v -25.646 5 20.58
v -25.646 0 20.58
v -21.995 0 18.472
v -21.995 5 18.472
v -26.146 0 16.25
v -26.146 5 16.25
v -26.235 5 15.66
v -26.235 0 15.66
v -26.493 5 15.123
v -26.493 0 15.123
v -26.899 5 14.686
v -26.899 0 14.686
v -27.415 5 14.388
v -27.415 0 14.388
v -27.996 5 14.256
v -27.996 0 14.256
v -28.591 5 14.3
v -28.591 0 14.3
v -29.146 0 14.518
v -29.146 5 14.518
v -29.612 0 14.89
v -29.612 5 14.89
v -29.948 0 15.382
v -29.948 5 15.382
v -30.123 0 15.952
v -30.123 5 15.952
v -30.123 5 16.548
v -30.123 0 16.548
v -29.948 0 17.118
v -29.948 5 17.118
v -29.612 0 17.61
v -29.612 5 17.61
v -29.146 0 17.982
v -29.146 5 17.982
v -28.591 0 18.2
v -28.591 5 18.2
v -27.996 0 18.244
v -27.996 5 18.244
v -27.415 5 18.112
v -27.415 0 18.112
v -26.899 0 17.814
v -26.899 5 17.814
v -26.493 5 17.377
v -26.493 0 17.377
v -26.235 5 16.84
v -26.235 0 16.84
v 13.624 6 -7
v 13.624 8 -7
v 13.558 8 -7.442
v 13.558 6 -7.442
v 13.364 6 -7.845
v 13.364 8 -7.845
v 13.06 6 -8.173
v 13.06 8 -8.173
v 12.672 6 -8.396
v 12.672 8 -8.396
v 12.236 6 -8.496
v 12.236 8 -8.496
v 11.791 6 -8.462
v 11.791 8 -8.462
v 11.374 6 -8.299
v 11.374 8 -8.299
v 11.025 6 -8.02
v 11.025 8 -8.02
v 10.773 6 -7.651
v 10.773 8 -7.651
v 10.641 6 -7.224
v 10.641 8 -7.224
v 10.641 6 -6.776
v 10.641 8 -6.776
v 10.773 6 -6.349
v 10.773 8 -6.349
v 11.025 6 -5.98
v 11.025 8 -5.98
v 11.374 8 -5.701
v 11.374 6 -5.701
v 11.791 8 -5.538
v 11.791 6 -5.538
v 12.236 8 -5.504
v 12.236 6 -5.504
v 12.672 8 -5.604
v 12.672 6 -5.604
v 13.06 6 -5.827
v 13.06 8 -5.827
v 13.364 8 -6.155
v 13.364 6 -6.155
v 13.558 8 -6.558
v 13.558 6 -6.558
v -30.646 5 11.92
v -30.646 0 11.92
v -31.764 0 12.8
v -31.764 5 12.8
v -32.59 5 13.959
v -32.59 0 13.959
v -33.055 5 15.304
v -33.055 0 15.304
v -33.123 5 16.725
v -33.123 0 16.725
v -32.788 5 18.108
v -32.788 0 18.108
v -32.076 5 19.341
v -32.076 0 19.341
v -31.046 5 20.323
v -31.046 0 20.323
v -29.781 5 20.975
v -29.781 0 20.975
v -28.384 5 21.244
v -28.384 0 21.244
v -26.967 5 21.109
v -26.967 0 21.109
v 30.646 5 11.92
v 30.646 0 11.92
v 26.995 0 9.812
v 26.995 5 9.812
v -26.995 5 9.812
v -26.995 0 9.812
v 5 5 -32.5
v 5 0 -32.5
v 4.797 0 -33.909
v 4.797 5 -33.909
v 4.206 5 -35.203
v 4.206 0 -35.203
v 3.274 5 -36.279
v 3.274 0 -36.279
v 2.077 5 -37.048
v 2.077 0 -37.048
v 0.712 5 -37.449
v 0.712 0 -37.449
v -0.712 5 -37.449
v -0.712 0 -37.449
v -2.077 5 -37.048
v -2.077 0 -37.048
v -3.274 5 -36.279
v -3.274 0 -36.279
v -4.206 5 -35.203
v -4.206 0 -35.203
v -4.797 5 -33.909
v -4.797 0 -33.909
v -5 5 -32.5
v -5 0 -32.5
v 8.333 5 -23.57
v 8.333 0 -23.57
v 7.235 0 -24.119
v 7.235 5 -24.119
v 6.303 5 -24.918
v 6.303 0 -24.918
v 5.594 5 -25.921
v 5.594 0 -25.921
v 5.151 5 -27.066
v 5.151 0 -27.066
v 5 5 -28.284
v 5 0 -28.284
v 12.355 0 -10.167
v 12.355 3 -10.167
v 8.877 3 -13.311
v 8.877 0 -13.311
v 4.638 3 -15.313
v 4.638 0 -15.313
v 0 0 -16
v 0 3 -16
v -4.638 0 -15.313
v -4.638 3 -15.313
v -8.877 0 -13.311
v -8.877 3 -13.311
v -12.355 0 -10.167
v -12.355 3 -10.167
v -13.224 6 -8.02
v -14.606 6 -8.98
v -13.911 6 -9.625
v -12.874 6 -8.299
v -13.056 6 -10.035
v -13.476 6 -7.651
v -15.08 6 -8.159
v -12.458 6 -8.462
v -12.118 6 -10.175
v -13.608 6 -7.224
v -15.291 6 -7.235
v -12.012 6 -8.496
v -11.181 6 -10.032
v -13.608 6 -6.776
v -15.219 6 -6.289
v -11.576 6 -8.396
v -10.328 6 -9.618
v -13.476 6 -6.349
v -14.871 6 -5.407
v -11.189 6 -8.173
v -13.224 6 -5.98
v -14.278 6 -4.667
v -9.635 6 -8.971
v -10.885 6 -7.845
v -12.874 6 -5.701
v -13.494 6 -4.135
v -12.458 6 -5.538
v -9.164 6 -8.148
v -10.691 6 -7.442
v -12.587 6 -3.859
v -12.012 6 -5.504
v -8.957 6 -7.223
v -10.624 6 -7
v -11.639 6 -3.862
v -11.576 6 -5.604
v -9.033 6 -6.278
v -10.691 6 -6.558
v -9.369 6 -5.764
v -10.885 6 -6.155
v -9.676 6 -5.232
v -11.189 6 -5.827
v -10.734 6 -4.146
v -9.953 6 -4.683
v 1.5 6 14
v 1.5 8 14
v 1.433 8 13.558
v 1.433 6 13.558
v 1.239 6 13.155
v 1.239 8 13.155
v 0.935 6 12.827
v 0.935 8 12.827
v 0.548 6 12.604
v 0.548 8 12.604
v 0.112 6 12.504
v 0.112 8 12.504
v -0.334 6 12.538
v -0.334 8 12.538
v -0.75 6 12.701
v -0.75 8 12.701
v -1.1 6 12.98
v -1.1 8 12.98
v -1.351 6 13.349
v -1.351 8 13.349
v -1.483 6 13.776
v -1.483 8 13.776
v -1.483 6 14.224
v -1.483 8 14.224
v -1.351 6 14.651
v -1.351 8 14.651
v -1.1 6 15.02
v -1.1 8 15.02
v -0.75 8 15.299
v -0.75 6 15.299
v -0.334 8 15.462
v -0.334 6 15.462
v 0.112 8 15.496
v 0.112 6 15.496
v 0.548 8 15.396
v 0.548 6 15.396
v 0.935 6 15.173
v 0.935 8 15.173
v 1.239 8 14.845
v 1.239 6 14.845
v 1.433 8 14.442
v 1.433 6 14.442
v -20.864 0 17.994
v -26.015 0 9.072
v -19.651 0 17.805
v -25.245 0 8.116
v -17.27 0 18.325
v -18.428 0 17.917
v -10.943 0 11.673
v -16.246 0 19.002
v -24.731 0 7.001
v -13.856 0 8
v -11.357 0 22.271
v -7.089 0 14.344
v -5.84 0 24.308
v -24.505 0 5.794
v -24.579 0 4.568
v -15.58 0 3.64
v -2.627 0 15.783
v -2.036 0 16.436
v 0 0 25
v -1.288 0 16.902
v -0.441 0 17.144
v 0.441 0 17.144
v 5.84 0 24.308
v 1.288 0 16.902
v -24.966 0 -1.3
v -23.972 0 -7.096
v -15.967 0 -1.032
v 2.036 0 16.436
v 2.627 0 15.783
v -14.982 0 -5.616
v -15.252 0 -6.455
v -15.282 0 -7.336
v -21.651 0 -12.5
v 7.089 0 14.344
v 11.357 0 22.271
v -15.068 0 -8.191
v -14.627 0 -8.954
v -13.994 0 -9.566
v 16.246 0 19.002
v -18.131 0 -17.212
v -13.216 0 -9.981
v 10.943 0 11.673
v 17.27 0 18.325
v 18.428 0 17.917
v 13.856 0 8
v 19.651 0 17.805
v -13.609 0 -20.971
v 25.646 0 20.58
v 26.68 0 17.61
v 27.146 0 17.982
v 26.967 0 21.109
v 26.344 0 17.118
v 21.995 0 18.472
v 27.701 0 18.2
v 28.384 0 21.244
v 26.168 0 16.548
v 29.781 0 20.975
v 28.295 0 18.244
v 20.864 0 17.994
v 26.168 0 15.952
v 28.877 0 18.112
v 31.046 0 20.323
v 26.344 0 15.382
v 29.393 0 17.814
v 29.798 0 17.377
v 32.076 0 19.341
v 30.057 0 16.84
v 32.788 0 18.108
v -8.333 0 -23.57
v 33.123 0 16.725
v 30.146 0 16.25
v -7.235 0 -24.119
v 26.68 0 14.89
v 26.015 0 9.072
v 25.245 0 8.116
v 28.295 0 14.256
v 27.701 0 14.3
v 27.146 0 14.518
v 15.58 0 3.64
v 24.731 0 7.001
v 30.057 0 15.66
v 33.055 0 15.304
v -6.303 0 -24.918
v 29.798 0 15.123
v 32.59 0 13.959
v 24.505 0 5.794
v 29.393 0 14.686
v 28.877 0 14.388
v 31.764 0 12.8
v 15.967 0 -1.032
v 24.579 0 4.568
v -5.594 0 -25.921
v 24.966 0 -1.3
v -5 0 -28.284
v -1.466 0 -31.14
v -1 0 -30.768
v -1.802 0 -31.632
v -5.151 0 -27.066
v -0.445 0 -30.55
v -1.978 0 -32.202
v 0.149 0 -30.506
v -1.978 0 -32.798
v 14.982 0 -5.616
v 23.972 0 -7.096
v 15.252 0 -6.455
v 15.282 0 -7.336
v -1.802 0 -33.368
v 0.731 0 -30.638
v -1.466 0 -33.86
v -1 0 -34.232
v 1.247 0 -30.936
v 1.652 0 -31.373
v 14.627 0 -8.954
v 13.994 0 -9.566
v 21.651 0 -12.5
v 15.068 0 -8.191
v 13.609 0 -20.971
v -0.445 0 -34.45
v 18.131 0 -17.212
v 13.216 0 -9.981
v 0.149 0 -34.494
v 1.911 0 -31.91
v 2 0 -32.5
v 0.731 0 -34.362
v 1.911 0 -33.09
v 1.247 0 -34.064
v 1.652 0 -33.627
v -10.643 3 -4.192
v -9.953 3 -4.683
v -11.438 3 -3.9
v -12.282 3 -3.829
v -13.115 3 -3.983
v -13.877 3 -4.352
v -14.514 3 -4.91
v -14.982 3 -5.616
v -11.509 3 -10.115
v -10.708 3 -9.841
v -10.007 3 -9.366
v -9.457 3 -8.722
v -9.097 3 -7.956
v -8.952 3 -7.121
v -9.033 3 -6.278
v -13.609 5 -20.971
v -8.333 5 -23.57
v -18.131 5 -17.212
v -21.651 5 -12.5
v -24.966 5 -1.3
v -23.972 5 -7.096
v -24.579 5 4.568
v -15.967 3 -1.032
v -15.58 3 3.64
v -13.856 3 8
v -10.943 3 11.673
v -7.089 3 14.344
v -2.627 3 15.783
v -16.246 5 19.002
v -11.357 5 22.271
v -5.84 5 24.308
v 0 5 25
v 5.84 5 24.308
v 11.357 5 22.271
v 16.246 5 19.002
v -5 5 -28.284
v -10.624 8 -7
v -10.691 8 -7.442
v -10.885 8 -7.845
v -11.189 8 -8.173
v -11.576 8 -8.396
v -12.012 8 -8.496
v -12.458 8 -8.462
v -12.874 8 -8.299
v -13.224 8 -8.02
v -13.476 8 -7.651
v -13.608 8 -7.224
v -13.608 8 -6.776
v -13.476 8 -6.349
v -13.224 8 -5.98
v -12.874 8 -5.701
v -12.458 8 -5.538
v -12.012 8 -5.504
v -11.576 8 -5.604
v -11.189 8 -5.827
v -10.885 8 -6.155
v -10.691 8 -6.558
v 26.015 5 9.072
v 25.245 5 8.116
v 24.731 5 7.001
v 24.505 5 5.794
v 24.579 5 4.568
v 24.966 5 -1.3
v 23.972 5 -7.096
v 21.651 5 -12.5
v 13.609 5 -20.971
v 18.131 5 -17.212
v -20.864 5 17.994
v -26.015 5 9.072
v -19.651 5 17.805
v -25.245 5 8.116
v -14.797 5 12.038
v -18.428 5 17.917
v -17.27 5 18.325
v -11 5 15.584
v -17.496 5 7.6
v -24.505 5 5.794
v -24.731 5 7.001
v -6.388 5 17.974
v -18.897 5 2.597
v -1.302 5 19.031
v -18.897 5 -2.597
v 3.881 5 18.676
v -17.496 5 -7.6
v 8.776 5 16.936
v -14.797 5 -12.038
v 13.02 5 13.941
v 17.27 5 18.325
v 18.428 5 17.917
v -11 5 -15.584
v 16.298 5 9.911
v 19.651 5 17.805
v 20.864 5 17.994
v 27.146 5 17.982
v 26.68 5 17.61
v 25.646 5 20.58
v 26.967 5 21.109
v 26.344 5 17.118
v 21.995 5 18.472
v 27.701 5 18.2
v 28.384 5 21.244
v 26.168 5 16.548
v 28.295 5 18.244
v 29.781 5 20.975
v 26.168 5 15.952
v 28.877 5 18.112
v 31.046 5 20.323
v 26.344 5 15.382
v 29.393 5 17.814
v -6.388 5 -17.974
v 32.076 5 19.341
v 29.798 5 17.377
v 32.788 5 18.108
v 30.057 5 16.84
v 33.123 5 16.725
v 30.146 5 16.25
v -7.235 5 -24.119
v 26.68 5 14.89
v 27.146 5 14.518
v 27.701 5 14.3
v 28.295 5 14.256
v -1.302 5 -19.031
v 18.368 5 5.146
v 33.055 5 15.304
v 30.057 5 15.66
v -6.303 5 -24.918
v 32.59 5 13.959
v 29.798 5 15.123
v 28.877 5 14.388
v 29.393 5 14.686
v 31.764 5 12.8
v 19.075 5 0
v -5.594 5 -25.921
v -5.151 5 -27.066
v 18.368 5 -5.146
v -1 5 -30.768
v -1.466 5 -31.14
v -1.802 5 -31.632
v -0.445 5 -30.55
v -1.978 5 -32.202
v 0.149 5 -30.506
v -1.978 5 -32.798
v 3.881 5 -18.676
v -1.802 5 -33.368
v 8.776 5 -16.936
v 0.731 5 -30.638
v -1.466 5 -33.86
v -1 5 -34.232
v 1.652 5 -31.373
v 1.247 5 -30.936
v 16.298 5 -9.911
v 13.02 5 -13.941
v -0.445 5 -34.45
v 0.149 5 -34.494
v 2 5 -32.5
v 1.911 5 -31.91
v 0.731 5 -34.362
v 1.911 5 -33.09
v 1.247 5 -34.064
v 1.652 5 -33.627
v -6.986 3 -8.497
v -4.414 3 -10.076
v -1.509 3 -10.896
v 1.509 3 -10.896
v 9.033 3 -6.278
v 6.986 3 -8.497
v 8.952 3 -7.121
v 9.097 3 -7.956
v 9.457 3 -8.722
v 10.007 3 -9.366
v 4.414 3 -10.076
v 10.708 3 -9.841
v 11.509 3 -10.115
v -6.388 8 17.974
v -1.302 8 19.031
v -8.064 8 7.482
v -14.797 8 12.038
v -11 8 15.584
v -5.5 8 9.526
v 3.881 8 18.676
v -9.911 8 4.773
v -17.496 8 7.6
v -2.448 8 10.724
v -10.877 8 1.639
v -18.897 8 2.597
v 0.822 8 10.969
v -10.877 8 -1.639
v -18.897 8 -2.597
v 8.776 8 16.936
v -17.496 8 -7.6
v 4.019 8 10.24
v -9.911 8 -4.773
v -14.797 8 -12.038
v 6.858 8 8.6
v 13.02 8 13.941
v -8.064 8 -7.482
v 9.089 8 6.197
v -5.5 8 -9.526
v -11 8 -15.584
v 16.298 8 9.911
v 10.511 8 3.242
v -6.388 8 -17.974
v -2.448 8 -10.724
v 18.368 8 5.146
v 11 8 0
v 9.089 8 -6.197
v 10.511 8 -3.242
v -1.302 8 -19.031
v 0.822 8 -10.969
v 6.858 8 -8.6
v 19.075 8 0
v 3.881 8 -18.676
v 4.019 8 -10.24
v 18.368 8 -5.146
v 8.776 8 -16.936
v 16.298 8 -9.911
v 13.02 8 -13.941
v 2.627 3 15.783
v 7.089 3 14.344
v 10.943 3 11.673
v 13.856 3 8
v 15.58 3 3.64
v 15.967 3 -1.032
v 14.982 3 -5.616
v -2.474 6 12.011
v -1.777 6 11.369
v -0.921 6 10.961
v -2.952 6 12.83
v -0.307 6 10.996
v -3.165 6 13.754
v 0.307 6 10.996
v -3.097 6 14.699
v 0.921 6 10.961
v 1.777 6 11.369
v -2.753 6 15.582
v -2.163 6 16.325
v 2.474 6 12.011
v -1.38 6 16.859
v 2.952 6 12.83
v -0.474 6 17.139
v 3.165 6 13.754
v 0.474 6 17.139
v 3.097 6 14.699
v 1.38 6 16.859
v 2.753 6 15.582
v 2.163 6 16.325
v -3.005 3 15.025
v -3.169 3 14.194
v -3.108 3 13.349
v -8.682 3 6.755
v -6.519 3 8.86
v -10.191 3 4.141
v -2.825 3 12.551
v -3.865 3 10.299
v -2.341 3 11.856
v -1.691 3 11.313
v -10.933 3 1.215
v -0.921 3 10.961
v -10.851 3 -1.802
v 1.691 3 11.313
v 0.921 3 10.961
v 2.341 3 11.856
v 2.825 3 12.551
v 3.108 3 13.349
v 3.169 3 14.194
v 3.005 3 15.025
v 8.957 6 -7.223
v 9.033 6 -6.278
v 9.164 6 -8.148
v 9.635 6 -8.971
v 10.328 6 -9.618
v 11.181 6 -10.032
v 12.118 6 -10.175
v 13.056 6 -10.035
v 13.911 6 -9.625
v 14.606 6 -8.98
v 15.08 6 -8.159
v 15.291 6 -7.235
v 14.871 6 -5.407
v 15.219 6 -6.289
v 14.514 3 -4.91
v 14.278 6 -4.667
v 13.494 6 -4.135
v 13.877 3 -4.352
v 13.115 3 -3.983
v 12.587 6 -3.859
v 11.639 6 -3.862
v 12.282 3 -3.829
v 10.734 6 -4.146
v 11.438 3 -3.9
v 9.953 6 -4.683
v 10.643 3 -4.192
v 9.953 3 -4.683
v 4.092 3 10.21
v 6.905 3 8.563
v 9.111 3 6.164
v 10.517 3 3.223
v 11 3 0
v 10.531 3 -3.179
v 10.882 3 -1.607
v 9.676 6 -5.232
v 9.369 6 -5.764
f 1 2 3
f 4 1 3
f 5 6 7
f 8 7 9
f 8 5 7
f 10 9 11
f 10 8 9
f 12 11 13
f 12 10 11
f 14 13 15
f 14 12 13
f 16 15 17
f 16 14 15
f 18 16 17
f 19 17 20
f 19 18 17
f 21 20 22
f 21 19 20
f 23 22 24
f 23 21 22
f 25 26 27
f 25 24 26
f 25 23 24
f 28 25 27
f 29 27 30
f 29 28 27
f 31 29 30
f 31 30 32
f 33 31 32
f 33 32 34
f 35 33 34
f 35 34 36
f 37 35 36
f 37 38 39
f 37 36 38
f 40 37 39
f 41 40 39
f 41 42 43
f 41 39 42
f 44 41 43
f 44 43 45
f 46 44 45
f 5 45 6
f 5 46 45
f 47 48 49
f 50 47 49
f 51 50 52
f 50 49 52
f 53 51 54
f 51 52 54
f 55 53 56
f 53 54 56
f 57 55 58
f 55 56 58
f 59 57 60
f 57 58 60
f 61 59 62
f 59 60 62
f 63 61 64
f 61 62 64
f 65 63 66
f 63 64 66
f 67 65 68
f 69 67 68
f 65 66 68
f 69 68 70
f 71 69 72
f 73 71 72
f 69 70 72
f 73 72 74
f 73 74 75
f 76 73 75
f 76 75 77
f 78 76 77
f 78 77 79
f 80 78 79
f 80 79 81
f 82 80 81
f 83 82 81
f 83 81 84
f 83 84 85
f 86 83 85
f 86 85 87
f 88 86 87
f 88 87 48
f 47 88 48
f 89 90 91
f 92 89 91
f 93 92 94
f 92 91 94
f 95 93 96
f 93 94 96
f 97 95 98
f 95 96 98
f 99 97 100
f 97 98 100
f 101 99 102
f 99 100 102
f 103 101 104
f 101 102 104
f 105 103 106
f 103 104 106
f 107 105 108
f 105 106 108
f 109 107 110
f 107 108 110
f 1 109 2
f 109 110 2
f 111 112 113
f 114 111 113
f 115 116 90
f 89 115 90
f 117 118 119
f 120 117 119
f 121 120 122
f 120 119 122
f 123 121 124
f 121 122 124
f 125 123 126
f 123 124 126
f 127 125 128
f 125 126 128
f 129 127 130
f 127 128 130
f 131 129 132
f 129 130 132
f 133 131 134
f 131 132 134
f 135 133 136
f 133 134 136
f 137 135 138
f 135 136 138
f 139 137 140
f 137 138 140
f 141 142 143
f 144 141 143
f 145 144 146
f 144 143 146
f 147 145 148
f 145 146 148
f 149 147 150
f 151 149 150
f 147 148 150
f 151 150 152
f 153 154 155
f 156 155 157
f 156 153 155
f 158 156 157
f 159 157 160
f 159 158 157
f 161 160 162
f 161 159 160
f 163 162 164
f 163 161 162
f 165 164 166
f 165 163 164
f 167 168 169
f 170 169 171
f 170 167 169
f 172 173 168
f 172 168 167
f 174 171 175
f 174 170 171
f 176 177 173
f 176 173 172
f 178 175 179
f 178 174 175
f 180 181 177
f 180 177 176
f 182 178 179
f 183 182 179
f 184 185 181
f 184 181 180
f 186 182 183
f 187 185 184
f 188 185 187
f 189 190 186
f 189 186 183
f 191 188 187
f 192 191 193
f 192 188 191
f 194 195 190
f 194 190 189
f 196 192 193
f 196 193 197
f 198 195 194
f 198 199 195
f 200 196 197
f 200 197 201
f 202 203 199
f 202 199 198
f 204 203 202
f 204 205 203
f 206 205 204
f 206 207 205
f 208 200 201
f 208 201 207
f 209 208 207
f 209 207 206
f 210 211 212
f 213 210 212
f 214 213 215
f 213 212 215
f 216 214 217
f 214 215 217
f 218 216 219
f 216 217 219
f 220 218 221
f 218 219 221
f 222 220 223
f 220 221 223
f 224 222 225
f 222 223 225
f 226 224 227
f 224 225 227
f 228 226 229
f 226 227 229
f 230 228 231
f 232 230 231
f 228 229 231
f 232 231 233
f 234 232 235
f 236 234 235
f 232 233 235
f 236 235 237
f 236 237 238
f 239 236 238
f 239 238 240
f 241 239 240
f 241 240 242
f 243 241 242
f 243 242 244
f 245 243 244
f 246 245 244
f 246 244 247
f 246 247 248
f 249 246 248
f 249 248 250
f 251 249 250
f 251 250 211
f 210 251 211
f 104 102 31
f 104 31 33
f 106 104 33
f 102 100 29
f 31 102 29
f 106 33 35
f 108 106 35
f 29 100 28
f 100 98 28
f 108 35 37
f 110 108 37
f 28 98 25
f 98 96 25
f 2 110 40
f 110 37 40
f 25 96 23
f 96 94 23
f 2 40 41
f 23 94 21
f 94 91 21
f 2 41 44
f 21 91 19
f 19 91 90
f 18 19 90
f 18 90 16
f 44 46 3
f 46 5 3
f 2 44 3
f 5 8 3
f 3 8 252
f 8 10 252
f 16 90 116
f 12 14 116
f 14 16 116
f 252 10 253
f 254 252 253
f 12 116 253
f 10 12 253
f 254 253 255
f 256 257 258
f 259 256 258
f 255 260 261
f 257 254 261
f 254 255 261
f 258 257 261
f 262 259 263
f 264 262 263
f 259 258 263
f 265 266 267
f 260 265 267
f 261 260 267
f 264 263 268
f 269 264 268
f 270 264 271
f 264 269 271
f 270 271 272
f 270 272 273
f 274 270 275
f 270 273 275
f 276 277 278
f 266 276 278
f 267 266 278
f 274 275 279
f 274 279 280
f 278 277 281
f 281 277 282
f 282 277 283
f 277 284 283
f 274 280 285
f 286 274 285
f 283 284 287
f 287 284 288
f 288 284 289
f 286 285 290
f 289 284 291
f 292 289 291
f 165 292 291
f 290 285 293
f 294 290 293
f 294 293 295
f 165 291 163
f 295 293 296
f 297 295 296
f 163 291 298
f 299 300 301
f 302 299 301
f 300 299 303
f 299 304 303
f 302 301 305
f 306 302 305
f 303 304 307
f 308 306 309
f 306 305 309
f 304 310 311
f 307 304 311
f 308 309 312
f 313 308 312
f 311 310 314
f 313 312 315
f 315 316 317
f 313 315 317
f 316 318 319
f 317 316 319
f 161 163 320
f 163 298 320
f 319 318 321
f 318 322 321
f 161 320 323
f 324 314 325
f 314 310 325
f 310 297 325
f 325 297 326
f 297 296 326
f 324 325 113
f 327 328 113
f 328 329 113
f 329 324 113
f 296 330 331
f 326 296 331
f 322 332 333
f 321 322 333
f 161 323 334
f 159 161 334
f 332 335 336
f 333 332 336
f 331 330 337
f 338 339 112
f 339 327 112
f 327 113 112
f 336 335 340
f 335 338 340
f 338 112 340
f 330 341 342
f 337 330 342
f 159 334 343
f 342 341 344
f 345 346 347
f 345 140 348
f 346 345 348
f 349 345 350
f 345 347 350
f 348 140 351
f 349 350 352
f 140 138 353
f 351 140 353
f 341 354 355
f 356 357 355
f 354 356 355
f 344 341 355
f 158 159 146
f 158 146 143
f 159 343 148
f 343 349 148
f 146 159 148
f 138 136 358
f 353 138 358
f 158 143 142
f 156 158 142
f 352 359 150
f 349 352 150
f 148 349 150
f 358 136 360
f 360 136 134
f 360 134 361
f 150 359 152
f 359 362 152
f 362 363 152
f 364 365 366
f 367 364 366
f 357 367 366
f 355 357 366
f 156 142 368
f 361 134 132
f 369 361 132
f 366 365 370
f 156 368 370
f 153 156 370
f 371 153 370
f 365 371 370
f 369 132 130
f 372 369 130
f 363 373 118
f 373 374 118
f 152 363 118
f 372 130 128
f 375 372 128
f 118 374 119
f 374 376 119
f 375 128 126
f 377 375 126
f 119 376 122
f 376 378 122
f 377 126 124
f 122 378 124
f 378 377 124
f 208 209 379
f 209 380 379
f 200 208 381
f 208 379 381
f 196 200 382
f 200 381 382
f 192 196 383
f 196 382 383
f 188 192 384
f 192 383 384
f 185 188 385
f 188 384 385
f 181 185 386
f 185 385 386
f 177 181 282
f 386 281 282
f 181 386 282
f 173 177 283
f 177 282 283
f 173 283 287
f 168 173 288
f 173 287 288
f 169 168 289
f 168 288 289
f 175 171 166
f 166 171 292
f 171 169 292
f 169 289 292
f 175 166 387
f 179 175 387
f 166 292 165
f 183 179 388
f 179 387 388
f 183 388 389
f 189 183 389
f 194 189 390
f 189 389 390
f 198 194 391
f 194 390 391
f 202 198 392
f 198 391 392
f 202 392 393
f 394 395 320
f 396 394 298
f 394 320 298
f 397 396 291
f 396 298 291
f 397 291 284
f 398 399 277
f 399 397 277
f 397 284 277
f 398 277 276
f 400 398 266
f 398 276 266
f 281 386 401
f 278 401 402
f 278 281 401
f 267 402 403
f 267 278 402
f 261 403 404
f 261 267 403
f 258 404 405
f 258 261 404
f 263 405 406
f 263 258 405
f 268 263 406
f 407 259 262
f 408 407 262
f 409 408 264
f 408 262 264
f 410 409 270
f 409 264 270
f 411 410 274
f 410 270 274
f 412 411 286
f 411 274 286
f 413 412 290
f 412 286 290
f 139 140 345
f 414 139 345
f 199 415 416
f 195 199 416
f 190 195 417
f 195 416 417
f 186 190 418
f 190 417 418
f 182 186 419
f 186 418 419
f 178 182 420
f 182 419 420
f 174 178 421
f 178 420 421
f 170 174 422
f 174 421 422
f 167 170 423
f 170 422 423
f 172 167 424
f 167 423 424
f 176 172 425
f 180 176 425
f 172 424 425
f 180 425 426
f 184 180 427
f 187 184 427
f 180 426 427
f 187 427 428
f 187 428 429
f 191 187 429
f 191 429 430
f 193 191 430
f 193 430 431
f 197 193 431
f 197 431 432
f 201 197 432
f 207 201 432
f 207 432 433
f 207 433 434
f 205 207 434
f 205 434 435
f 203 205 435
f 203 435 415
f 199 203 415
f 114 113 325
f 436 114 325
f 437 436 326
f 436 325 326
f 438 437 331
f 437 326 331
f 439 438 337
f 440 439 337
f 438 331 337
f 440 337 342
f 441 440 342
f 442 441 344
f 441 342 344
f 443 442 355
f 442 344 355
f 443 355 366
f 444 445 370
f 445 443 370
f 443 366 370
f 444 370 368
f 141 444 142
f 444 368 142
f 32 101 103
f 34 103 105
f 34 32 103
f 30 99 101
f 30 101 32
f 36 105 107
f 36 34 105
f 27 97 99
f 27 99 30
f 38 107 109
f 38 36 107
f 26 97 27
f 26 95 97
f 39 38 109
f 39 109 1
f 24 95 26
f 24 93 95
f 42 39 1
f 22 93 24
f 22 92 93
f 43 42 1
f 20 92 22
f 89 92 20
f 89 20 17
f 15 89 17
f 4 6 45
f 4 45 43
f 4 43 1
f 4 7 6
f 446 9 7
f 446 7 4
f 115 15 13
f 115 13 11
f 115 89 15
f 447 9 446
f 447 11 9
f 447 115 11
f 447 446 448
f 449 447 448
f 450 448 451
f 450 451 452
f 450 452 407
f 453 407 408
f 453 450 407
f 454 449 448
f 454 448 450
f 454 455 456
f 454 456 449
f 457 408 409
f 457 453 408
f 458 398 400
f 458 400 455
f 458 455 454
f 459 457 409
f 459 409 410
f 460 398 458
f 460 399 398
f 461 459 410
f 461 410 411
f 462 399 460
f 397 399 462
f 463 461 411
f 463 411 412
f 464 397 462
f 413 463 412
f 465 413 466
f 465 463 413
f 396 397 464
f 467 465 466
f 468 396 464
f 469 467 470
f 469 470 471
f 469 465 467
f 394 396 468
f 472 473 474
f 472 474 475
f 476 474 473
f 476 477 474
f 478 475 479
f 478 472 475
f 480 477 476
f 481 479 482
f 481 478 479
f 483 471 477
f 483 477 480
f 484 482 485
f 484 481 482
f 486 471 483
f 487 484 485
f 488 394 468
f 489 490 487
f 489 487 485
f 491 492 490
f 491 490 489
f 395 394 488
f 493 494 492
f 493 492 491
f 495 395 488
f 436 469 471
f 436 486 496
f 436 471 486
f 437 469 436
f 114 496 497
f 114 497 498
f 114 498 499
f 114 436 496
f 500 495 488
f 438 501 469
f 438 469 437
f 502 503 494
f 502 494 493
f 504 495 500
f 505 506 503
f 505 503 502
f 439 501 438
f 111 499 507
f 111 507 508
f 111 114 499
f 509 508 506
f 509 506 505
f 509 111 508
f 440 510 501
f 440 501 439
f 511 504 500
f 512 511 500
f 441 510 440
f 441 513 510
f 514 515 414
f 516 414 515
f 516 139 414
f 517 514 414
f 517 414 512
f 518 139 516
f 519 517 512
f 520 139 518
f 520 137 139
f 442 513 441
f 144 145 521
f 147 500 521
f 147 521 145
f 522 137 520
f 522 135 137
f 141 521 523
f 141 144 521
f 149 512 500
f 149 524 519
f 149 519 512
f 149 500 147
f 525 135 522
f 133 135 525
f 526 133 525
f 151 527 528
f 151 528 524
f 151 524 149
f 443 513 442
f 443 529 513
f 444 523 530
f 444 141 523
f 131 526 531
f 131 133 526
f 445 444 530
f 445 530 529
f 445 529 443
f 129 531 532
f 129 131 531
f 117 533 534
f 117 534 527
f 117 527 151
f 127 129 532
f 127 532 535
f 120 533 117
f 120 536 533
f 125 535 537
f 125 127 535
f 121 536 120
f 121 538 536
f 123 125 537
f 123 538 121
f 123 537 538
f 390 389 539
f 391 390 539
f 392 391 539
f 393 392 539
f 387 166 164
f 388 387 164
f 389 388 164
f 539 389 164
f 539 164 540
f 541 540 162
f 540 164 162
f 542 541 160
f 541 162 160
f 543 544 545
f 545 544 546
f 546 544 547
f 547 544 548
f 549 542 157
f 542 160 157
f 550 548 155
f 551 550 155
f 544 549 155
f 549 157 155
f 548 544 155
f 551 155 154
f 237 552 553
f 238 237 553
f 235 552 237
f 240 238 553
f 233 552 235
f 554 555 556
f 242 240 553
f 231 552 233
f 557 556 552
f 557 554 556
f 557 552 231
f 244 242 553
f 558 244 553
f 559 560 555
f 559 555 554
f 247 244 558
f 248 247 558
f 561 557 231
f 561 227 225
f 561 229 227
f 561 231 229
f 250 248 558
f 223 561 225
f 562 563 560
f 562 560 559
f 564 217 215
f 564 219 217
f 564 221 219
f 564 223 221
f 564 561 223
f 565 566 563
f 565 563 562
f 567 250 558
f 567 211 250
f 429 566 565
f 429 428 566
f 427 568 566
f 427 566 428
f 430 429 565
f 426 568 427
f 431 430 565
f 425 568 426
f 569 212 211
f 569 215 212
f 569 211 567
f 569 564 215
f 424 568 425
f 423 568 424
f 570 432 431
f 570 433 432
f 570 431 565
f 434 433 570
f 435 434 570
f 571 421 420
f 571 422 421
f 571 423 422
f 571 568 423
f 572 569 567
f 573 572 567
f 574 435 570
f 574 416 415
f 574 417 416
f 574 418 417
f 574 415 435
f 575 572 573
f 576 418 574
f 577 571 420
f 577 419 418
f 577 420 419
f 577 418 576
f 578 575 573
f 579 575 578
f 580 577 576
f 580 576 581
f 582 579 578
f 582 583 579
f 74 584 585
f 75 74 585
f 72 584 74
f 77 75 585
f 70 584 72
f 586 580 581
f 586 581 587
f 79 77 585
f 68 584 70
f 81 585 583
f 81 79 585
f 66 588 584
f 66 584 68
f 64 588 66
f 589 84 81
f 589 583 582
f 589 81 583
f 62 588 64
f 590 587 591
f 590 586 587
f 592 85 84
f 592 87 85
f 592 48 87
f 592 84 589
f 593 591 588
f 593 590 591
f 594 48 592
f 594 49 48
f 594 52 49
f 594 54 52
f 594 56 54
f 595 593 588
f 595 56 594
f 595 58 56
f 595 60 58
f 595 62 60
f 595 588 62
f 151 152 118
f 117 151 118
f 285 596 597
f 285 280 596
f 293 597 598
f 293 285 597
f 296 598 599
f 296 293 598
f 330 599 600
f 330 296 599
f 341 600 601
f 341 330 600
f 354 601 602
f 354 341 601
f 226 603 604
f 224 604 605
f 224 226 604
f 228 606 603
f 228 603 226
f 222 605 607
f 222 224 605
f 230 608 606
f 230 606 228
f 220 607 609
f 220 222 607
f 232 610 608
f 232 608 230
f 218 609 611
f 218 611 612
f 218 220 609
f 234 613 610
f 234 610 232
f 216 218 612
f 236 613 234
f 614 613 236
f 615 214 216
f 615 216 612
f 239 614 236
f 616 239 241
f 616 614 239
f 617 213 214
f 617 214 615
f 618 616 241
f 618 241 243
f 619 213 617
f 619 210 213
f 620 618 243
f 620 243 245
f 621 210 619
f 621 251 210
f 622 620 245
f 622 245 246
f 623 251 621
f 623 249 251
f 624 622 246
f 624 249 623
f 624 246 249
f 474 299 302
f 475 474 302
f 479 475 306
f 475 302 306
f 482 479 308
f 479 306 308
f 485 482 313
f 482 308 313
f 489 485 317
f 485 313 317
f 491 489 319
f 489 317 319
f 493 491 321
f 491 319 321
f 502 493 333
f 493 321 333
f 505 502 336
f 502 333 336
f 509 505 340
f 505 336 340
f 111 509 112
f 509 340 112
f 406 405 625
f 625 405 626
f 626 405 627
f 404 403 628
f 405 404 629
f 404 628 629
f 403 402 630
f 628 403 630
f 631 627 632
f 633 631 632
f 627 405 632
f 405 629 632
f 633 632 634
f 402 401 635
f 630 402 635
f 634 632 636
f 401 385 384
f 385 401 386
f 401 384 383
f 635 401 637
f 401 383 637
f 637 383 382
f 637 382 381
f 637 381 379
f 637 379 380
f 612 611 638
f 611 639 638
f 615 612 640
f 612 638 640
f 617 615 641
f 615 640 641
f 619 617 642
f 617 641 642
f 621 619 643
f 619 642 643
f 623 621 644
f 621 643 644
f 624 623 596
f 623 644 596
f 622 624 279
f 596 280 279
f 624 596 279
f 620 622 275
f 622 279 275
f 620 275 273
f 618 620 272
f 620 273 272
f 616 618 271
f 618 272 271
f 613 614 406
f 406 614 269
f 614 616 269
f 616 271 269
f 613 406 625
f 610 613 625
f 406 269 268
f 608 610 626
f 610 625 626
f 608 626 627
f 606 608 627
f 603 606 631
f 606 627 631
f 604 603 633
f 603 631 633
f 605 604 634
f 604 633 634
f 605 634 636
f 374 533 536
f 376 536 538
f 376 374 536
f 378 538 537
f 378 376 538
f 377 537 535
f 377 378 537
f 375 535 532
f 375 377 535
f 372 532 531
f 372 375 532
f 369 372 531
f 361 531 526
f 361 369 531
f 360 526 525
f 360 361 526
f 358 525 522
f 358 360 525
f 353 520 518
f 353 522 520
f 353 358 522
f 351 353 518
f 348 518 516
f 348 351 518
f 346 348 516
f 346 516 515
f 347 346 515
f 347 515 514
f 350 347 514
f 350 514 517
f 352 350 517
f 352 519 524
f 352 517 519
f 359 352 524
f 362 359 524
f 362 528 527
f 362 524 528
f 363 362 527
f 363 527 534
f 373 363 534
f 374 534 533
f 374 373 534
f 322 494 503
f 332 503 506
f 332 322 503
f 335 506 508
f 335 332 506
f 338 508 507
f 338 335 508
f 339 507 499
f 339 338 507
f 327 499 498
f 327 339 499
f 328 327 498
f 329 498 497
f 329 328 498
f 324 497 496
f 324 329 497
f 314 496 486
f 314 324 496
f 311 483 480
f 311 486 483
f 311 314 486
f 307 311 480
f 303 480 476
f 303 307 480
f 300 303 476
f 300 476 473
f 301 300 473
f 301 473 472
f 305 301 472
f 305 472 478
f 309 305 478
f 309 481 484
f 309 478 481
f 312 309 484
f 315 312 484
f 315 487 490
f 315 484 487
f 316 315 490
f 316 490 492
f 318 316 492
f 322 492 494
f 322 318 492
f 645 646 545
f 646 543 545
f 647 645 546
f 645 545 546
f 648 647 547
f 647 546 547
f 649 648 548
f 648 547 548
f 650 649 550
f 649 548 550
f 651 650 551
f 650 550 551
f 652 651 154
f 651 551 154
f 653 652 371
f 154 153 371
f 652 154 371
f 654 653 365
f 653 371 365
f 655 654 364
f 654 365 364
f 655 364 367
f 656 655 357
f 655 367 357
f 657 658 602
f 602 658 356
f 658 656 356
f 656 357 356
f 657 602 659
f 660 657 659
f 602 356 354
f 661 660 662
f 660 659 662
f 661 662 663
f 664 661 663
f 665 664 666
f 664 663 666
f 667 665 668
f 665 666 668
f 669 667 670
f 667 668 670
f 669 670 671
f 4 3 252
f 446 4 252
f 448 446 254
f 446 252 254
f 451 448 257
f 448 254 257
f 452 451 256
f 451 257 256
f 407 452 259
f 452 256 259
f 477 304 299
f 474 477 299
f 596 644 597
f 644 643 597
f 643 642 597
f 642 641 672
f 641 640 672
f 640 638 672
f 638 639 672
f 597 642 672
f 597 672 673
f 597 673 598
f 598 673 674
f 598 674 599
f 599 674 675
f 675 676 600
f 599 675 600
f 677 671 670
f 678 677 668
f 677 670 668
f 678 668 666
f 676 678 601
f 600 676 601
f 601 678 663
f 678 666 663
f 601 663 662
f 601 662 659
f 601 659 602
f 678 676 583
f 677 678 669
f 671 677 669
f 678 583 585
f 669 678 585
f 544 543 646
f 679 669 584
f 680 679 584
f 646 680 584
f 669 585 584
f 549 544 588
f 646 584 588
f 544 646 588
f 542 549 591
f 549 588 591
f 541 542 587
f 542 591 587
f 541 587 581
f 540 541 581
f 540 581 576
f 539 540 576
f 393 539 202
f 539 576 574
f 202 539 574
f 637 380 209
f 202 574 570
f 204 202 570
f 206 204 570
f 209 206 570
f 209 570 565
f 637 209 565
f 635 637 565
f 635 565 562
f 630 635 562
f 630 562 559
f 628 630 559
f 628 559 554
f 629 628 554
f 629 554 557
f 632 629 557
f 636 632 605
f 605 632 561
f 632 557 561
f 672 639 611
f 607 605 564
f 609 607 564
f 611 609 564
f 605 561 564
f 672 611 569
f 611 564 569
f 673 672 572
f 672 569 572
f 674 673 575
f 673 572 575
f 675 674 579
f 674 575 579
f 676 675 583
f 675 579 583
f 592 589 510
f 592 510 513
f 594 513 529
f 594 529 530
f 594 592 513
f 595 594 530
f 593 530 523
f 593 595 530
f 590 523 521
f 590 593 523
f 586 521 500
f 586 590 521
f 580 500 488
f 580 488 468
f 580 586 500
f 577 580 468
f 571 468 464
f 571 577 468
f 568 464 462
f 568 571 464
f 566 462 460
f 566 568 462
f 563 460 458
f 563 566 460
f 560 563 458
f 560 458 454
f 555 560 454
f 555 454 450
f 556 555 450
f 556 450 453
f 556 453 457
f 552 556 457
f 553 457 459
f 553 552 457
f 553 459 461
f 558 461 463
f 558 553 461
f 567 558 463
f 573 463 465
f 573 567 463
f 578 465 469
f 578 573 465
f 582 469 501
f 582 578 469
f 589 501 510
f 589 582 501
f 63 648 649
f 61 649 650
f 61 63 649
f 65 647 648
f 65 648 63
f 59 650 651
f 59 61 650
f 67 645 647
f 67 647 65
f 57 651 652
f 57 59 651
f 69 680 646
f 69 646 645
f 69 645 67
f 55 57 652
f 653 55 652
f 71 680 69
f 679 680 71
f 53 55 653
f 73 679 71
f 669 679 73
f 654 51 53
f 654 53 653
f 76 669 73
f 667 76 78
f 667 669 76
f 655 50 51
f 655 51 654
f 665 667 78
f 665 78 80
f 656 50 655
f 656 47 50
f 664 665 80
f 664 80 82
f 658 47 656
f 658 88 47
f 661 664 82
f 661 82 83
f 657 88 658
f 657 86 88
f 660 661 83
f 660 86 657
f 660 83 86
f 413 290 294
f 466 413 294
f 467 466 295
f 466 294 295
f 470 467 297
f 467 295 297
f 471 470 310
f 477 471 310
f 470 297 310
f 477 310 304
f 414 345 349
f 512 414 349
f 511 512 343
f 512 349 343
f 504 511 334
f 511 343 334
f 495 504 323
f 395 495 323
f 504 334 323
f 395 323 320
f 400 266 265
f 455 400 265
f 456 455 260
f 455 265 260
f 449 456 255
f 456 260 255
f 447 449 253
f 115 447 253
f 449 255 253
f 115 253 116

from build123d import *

# Parameters (mm, degrees)
SKETCH1_R           = 16
SKETCH1_R_2         = 2
BOSS_EXTRUDE1_DEPTH = 8
SKETCH4_R           = 16
SKETCH4_R_2         = 11
BOSS_EXTRUDE3_DEPTH = 5
SKETCH5_R           = 1.5
CUT_EXTRUDE2_DEPTH  = 9
SKETCH6_R           = 3.175
CUT_EXTRUDE3_DEPTH  = 6
SKETCH7_OUTSIDE_W   = 86.584
SKETCH7_OUTSIDE_H   = 82.792
SKETCH7_OUTSIDE_R   = 19.075
CUT_EXTRUDE4_DEPTH  = 3


with BuildPart() as part:
    # Sketch1 → Boss-Extrude1 (new body)
    with BuildSketch(Plane(origin=(0, 0, 0), x_dir=(1, 0, 0), z_dir=(0, 1, 0))):
        with BuildLine():
            Line((30.645825623, -11.919872981), (26.994897428, -9.812008605))
            ThreePointArc((26.994897428, -9.812008605), (24.953655976, -7.574039819), (24.57908119, -4.568234655))
            ThreePointArc((24.57908119, -4.568234655), (21.650635095, 12.5), (8.333333333, 23.57022604))
            ThreePointArc((8.333333333, 23.57022604), (5.917517095, 25.397519902), (5, 28.284271247))
            Line((5, 28.284271247), (5, 32.5))
            ThreePointArc((5, 32.5), (0, 37.5), (-5, 32.5))
            Line((-5, 32.5), (-5, 28.284271247))
            ThreePointArc((-5, 28.284271247), (-5.917517095, 25.397519902), (-8.333333333, 23.57022604))
            ThreePointArc((-8.333333333, 23.57022604), (-21.650635095, 12.5), (-24.57908119, -4.568234655))
            ThreePointArc((-24.57908119, -4.568234655), (-24.953655976, -7.574039819), (-26.994897428, -9.812008605))
            Line((-26.994897428, -9.812008605), (-30.645825623, -11.919872981))
            ThreePointArc((-30.645825623, -11.919872981), (-32.475952642, -18.75), (-25.645825623, -20.580127019))
            Line((-25.645825623, -20.580127019), (-21.994897428, -18.472262643))
            ThreePointArc((-21.994897428, -18.472262643), (-19.03613888, -17.823480083), (-16.245747857, -19.001991385))
            ThreePointArc((-16.245747857, -19.001991385), (0, -25), (16.245747857, -19.001991385))
            ThreePointArc((16.245747857, -19.001991385), (19.03613888, -17.823480083), (21.994897428, -18.472262643))
            Line((21.994897428, -18.472262643), (25.645825623, -20.580127019))
            ThreePointArc((25.645825623, -20.580127019), (32.475952642, -18.75), (30.645825623, -11.919872981))
        make_face()
        Circle(SKETCH1_R, mode=Mode.SUBTRACT)
        with Locations((0, 32.5)):
            Circle(SKETCH1_R_2, mode=Mode.SUBTRACT)
        with Locations((-28.145825623, -16.25)):
            Circle(SKETCH1_R_2, mode=Mode.SUBTRACT)
        with Locations((28.145825623, -16.25)):
            Circle(SKETCH1_R_2, mode=Mode.SUBTRACT)
    extrude(amount=BOSS_EXTRUDE1_DEPTH)

    # Sketch4 → Boss-Extrude3 (add)
    with BuildSketch(Plane(origin=(0, 8, 0), x_dir=(1, 0, 0), z_dir=(0, 1, 0))):
        Circle(SKETCH4_R)
        Circle(SKETCH4_R_2, mode=Mode.SUBTRACT)
    extrude(amount=-BOSS_EXTRUDE3_DEPTH)

    # Sketch5 → Cut-Extrude2 (cut, through all)
    with BuildSketch(Plane(origin=(0, 8, 0), x_dir=(1, 0, 0), z_dir=(0, 1, 0))):
        with Locations((0, -14)):
            Circle(SKETCH5_R)
        with Locations((-12.124355653, 7)):
            Circle(SKETCH5_R)
        with Locations((12.124355653, 7)):
            Circle(SKETCH5_R)
    extrude(amount=-CUT_EXTRUDE2_DEPTH, mode=Mode.SUBTRACT)

    # Sketch6 → Cut-Extrude3 (cut)
    with BuildSketch(Plane.XZ):
        with Locations((0, 14)):
            Circle(SKETCH6_R)
        with Locations((-12.124355653, -7)):
            Circle(SKETCH6_R)
        with Locations((12.124355653, -7)):
            Circle(SKETCH6_R)
    extrude(amount=-CUT_EXTRUDE3_DEPTH, mode=Mode.SUBTRACT)

    # Sketch7 outside → Cut-Extrude4 (cut)
    with BuildSketch(Plane(origin=(0, 8, 0), x_dir=(1, 0, 0), z_dir=(0, 1, 0))):
        with Locations((0, 6.25)):
            Rectangle(SKETCH7_OUTSIDE_W, SKETCH7_OUTSIDE_H)
        Circle(SKETCH7_OUTSIDE_R, mode=Mode.SUBTRACT)
    extrude(amount=-CUT_EXTRUDE4_DEPTH, mode=Mode.SUBTRACT)


solid = part.part
